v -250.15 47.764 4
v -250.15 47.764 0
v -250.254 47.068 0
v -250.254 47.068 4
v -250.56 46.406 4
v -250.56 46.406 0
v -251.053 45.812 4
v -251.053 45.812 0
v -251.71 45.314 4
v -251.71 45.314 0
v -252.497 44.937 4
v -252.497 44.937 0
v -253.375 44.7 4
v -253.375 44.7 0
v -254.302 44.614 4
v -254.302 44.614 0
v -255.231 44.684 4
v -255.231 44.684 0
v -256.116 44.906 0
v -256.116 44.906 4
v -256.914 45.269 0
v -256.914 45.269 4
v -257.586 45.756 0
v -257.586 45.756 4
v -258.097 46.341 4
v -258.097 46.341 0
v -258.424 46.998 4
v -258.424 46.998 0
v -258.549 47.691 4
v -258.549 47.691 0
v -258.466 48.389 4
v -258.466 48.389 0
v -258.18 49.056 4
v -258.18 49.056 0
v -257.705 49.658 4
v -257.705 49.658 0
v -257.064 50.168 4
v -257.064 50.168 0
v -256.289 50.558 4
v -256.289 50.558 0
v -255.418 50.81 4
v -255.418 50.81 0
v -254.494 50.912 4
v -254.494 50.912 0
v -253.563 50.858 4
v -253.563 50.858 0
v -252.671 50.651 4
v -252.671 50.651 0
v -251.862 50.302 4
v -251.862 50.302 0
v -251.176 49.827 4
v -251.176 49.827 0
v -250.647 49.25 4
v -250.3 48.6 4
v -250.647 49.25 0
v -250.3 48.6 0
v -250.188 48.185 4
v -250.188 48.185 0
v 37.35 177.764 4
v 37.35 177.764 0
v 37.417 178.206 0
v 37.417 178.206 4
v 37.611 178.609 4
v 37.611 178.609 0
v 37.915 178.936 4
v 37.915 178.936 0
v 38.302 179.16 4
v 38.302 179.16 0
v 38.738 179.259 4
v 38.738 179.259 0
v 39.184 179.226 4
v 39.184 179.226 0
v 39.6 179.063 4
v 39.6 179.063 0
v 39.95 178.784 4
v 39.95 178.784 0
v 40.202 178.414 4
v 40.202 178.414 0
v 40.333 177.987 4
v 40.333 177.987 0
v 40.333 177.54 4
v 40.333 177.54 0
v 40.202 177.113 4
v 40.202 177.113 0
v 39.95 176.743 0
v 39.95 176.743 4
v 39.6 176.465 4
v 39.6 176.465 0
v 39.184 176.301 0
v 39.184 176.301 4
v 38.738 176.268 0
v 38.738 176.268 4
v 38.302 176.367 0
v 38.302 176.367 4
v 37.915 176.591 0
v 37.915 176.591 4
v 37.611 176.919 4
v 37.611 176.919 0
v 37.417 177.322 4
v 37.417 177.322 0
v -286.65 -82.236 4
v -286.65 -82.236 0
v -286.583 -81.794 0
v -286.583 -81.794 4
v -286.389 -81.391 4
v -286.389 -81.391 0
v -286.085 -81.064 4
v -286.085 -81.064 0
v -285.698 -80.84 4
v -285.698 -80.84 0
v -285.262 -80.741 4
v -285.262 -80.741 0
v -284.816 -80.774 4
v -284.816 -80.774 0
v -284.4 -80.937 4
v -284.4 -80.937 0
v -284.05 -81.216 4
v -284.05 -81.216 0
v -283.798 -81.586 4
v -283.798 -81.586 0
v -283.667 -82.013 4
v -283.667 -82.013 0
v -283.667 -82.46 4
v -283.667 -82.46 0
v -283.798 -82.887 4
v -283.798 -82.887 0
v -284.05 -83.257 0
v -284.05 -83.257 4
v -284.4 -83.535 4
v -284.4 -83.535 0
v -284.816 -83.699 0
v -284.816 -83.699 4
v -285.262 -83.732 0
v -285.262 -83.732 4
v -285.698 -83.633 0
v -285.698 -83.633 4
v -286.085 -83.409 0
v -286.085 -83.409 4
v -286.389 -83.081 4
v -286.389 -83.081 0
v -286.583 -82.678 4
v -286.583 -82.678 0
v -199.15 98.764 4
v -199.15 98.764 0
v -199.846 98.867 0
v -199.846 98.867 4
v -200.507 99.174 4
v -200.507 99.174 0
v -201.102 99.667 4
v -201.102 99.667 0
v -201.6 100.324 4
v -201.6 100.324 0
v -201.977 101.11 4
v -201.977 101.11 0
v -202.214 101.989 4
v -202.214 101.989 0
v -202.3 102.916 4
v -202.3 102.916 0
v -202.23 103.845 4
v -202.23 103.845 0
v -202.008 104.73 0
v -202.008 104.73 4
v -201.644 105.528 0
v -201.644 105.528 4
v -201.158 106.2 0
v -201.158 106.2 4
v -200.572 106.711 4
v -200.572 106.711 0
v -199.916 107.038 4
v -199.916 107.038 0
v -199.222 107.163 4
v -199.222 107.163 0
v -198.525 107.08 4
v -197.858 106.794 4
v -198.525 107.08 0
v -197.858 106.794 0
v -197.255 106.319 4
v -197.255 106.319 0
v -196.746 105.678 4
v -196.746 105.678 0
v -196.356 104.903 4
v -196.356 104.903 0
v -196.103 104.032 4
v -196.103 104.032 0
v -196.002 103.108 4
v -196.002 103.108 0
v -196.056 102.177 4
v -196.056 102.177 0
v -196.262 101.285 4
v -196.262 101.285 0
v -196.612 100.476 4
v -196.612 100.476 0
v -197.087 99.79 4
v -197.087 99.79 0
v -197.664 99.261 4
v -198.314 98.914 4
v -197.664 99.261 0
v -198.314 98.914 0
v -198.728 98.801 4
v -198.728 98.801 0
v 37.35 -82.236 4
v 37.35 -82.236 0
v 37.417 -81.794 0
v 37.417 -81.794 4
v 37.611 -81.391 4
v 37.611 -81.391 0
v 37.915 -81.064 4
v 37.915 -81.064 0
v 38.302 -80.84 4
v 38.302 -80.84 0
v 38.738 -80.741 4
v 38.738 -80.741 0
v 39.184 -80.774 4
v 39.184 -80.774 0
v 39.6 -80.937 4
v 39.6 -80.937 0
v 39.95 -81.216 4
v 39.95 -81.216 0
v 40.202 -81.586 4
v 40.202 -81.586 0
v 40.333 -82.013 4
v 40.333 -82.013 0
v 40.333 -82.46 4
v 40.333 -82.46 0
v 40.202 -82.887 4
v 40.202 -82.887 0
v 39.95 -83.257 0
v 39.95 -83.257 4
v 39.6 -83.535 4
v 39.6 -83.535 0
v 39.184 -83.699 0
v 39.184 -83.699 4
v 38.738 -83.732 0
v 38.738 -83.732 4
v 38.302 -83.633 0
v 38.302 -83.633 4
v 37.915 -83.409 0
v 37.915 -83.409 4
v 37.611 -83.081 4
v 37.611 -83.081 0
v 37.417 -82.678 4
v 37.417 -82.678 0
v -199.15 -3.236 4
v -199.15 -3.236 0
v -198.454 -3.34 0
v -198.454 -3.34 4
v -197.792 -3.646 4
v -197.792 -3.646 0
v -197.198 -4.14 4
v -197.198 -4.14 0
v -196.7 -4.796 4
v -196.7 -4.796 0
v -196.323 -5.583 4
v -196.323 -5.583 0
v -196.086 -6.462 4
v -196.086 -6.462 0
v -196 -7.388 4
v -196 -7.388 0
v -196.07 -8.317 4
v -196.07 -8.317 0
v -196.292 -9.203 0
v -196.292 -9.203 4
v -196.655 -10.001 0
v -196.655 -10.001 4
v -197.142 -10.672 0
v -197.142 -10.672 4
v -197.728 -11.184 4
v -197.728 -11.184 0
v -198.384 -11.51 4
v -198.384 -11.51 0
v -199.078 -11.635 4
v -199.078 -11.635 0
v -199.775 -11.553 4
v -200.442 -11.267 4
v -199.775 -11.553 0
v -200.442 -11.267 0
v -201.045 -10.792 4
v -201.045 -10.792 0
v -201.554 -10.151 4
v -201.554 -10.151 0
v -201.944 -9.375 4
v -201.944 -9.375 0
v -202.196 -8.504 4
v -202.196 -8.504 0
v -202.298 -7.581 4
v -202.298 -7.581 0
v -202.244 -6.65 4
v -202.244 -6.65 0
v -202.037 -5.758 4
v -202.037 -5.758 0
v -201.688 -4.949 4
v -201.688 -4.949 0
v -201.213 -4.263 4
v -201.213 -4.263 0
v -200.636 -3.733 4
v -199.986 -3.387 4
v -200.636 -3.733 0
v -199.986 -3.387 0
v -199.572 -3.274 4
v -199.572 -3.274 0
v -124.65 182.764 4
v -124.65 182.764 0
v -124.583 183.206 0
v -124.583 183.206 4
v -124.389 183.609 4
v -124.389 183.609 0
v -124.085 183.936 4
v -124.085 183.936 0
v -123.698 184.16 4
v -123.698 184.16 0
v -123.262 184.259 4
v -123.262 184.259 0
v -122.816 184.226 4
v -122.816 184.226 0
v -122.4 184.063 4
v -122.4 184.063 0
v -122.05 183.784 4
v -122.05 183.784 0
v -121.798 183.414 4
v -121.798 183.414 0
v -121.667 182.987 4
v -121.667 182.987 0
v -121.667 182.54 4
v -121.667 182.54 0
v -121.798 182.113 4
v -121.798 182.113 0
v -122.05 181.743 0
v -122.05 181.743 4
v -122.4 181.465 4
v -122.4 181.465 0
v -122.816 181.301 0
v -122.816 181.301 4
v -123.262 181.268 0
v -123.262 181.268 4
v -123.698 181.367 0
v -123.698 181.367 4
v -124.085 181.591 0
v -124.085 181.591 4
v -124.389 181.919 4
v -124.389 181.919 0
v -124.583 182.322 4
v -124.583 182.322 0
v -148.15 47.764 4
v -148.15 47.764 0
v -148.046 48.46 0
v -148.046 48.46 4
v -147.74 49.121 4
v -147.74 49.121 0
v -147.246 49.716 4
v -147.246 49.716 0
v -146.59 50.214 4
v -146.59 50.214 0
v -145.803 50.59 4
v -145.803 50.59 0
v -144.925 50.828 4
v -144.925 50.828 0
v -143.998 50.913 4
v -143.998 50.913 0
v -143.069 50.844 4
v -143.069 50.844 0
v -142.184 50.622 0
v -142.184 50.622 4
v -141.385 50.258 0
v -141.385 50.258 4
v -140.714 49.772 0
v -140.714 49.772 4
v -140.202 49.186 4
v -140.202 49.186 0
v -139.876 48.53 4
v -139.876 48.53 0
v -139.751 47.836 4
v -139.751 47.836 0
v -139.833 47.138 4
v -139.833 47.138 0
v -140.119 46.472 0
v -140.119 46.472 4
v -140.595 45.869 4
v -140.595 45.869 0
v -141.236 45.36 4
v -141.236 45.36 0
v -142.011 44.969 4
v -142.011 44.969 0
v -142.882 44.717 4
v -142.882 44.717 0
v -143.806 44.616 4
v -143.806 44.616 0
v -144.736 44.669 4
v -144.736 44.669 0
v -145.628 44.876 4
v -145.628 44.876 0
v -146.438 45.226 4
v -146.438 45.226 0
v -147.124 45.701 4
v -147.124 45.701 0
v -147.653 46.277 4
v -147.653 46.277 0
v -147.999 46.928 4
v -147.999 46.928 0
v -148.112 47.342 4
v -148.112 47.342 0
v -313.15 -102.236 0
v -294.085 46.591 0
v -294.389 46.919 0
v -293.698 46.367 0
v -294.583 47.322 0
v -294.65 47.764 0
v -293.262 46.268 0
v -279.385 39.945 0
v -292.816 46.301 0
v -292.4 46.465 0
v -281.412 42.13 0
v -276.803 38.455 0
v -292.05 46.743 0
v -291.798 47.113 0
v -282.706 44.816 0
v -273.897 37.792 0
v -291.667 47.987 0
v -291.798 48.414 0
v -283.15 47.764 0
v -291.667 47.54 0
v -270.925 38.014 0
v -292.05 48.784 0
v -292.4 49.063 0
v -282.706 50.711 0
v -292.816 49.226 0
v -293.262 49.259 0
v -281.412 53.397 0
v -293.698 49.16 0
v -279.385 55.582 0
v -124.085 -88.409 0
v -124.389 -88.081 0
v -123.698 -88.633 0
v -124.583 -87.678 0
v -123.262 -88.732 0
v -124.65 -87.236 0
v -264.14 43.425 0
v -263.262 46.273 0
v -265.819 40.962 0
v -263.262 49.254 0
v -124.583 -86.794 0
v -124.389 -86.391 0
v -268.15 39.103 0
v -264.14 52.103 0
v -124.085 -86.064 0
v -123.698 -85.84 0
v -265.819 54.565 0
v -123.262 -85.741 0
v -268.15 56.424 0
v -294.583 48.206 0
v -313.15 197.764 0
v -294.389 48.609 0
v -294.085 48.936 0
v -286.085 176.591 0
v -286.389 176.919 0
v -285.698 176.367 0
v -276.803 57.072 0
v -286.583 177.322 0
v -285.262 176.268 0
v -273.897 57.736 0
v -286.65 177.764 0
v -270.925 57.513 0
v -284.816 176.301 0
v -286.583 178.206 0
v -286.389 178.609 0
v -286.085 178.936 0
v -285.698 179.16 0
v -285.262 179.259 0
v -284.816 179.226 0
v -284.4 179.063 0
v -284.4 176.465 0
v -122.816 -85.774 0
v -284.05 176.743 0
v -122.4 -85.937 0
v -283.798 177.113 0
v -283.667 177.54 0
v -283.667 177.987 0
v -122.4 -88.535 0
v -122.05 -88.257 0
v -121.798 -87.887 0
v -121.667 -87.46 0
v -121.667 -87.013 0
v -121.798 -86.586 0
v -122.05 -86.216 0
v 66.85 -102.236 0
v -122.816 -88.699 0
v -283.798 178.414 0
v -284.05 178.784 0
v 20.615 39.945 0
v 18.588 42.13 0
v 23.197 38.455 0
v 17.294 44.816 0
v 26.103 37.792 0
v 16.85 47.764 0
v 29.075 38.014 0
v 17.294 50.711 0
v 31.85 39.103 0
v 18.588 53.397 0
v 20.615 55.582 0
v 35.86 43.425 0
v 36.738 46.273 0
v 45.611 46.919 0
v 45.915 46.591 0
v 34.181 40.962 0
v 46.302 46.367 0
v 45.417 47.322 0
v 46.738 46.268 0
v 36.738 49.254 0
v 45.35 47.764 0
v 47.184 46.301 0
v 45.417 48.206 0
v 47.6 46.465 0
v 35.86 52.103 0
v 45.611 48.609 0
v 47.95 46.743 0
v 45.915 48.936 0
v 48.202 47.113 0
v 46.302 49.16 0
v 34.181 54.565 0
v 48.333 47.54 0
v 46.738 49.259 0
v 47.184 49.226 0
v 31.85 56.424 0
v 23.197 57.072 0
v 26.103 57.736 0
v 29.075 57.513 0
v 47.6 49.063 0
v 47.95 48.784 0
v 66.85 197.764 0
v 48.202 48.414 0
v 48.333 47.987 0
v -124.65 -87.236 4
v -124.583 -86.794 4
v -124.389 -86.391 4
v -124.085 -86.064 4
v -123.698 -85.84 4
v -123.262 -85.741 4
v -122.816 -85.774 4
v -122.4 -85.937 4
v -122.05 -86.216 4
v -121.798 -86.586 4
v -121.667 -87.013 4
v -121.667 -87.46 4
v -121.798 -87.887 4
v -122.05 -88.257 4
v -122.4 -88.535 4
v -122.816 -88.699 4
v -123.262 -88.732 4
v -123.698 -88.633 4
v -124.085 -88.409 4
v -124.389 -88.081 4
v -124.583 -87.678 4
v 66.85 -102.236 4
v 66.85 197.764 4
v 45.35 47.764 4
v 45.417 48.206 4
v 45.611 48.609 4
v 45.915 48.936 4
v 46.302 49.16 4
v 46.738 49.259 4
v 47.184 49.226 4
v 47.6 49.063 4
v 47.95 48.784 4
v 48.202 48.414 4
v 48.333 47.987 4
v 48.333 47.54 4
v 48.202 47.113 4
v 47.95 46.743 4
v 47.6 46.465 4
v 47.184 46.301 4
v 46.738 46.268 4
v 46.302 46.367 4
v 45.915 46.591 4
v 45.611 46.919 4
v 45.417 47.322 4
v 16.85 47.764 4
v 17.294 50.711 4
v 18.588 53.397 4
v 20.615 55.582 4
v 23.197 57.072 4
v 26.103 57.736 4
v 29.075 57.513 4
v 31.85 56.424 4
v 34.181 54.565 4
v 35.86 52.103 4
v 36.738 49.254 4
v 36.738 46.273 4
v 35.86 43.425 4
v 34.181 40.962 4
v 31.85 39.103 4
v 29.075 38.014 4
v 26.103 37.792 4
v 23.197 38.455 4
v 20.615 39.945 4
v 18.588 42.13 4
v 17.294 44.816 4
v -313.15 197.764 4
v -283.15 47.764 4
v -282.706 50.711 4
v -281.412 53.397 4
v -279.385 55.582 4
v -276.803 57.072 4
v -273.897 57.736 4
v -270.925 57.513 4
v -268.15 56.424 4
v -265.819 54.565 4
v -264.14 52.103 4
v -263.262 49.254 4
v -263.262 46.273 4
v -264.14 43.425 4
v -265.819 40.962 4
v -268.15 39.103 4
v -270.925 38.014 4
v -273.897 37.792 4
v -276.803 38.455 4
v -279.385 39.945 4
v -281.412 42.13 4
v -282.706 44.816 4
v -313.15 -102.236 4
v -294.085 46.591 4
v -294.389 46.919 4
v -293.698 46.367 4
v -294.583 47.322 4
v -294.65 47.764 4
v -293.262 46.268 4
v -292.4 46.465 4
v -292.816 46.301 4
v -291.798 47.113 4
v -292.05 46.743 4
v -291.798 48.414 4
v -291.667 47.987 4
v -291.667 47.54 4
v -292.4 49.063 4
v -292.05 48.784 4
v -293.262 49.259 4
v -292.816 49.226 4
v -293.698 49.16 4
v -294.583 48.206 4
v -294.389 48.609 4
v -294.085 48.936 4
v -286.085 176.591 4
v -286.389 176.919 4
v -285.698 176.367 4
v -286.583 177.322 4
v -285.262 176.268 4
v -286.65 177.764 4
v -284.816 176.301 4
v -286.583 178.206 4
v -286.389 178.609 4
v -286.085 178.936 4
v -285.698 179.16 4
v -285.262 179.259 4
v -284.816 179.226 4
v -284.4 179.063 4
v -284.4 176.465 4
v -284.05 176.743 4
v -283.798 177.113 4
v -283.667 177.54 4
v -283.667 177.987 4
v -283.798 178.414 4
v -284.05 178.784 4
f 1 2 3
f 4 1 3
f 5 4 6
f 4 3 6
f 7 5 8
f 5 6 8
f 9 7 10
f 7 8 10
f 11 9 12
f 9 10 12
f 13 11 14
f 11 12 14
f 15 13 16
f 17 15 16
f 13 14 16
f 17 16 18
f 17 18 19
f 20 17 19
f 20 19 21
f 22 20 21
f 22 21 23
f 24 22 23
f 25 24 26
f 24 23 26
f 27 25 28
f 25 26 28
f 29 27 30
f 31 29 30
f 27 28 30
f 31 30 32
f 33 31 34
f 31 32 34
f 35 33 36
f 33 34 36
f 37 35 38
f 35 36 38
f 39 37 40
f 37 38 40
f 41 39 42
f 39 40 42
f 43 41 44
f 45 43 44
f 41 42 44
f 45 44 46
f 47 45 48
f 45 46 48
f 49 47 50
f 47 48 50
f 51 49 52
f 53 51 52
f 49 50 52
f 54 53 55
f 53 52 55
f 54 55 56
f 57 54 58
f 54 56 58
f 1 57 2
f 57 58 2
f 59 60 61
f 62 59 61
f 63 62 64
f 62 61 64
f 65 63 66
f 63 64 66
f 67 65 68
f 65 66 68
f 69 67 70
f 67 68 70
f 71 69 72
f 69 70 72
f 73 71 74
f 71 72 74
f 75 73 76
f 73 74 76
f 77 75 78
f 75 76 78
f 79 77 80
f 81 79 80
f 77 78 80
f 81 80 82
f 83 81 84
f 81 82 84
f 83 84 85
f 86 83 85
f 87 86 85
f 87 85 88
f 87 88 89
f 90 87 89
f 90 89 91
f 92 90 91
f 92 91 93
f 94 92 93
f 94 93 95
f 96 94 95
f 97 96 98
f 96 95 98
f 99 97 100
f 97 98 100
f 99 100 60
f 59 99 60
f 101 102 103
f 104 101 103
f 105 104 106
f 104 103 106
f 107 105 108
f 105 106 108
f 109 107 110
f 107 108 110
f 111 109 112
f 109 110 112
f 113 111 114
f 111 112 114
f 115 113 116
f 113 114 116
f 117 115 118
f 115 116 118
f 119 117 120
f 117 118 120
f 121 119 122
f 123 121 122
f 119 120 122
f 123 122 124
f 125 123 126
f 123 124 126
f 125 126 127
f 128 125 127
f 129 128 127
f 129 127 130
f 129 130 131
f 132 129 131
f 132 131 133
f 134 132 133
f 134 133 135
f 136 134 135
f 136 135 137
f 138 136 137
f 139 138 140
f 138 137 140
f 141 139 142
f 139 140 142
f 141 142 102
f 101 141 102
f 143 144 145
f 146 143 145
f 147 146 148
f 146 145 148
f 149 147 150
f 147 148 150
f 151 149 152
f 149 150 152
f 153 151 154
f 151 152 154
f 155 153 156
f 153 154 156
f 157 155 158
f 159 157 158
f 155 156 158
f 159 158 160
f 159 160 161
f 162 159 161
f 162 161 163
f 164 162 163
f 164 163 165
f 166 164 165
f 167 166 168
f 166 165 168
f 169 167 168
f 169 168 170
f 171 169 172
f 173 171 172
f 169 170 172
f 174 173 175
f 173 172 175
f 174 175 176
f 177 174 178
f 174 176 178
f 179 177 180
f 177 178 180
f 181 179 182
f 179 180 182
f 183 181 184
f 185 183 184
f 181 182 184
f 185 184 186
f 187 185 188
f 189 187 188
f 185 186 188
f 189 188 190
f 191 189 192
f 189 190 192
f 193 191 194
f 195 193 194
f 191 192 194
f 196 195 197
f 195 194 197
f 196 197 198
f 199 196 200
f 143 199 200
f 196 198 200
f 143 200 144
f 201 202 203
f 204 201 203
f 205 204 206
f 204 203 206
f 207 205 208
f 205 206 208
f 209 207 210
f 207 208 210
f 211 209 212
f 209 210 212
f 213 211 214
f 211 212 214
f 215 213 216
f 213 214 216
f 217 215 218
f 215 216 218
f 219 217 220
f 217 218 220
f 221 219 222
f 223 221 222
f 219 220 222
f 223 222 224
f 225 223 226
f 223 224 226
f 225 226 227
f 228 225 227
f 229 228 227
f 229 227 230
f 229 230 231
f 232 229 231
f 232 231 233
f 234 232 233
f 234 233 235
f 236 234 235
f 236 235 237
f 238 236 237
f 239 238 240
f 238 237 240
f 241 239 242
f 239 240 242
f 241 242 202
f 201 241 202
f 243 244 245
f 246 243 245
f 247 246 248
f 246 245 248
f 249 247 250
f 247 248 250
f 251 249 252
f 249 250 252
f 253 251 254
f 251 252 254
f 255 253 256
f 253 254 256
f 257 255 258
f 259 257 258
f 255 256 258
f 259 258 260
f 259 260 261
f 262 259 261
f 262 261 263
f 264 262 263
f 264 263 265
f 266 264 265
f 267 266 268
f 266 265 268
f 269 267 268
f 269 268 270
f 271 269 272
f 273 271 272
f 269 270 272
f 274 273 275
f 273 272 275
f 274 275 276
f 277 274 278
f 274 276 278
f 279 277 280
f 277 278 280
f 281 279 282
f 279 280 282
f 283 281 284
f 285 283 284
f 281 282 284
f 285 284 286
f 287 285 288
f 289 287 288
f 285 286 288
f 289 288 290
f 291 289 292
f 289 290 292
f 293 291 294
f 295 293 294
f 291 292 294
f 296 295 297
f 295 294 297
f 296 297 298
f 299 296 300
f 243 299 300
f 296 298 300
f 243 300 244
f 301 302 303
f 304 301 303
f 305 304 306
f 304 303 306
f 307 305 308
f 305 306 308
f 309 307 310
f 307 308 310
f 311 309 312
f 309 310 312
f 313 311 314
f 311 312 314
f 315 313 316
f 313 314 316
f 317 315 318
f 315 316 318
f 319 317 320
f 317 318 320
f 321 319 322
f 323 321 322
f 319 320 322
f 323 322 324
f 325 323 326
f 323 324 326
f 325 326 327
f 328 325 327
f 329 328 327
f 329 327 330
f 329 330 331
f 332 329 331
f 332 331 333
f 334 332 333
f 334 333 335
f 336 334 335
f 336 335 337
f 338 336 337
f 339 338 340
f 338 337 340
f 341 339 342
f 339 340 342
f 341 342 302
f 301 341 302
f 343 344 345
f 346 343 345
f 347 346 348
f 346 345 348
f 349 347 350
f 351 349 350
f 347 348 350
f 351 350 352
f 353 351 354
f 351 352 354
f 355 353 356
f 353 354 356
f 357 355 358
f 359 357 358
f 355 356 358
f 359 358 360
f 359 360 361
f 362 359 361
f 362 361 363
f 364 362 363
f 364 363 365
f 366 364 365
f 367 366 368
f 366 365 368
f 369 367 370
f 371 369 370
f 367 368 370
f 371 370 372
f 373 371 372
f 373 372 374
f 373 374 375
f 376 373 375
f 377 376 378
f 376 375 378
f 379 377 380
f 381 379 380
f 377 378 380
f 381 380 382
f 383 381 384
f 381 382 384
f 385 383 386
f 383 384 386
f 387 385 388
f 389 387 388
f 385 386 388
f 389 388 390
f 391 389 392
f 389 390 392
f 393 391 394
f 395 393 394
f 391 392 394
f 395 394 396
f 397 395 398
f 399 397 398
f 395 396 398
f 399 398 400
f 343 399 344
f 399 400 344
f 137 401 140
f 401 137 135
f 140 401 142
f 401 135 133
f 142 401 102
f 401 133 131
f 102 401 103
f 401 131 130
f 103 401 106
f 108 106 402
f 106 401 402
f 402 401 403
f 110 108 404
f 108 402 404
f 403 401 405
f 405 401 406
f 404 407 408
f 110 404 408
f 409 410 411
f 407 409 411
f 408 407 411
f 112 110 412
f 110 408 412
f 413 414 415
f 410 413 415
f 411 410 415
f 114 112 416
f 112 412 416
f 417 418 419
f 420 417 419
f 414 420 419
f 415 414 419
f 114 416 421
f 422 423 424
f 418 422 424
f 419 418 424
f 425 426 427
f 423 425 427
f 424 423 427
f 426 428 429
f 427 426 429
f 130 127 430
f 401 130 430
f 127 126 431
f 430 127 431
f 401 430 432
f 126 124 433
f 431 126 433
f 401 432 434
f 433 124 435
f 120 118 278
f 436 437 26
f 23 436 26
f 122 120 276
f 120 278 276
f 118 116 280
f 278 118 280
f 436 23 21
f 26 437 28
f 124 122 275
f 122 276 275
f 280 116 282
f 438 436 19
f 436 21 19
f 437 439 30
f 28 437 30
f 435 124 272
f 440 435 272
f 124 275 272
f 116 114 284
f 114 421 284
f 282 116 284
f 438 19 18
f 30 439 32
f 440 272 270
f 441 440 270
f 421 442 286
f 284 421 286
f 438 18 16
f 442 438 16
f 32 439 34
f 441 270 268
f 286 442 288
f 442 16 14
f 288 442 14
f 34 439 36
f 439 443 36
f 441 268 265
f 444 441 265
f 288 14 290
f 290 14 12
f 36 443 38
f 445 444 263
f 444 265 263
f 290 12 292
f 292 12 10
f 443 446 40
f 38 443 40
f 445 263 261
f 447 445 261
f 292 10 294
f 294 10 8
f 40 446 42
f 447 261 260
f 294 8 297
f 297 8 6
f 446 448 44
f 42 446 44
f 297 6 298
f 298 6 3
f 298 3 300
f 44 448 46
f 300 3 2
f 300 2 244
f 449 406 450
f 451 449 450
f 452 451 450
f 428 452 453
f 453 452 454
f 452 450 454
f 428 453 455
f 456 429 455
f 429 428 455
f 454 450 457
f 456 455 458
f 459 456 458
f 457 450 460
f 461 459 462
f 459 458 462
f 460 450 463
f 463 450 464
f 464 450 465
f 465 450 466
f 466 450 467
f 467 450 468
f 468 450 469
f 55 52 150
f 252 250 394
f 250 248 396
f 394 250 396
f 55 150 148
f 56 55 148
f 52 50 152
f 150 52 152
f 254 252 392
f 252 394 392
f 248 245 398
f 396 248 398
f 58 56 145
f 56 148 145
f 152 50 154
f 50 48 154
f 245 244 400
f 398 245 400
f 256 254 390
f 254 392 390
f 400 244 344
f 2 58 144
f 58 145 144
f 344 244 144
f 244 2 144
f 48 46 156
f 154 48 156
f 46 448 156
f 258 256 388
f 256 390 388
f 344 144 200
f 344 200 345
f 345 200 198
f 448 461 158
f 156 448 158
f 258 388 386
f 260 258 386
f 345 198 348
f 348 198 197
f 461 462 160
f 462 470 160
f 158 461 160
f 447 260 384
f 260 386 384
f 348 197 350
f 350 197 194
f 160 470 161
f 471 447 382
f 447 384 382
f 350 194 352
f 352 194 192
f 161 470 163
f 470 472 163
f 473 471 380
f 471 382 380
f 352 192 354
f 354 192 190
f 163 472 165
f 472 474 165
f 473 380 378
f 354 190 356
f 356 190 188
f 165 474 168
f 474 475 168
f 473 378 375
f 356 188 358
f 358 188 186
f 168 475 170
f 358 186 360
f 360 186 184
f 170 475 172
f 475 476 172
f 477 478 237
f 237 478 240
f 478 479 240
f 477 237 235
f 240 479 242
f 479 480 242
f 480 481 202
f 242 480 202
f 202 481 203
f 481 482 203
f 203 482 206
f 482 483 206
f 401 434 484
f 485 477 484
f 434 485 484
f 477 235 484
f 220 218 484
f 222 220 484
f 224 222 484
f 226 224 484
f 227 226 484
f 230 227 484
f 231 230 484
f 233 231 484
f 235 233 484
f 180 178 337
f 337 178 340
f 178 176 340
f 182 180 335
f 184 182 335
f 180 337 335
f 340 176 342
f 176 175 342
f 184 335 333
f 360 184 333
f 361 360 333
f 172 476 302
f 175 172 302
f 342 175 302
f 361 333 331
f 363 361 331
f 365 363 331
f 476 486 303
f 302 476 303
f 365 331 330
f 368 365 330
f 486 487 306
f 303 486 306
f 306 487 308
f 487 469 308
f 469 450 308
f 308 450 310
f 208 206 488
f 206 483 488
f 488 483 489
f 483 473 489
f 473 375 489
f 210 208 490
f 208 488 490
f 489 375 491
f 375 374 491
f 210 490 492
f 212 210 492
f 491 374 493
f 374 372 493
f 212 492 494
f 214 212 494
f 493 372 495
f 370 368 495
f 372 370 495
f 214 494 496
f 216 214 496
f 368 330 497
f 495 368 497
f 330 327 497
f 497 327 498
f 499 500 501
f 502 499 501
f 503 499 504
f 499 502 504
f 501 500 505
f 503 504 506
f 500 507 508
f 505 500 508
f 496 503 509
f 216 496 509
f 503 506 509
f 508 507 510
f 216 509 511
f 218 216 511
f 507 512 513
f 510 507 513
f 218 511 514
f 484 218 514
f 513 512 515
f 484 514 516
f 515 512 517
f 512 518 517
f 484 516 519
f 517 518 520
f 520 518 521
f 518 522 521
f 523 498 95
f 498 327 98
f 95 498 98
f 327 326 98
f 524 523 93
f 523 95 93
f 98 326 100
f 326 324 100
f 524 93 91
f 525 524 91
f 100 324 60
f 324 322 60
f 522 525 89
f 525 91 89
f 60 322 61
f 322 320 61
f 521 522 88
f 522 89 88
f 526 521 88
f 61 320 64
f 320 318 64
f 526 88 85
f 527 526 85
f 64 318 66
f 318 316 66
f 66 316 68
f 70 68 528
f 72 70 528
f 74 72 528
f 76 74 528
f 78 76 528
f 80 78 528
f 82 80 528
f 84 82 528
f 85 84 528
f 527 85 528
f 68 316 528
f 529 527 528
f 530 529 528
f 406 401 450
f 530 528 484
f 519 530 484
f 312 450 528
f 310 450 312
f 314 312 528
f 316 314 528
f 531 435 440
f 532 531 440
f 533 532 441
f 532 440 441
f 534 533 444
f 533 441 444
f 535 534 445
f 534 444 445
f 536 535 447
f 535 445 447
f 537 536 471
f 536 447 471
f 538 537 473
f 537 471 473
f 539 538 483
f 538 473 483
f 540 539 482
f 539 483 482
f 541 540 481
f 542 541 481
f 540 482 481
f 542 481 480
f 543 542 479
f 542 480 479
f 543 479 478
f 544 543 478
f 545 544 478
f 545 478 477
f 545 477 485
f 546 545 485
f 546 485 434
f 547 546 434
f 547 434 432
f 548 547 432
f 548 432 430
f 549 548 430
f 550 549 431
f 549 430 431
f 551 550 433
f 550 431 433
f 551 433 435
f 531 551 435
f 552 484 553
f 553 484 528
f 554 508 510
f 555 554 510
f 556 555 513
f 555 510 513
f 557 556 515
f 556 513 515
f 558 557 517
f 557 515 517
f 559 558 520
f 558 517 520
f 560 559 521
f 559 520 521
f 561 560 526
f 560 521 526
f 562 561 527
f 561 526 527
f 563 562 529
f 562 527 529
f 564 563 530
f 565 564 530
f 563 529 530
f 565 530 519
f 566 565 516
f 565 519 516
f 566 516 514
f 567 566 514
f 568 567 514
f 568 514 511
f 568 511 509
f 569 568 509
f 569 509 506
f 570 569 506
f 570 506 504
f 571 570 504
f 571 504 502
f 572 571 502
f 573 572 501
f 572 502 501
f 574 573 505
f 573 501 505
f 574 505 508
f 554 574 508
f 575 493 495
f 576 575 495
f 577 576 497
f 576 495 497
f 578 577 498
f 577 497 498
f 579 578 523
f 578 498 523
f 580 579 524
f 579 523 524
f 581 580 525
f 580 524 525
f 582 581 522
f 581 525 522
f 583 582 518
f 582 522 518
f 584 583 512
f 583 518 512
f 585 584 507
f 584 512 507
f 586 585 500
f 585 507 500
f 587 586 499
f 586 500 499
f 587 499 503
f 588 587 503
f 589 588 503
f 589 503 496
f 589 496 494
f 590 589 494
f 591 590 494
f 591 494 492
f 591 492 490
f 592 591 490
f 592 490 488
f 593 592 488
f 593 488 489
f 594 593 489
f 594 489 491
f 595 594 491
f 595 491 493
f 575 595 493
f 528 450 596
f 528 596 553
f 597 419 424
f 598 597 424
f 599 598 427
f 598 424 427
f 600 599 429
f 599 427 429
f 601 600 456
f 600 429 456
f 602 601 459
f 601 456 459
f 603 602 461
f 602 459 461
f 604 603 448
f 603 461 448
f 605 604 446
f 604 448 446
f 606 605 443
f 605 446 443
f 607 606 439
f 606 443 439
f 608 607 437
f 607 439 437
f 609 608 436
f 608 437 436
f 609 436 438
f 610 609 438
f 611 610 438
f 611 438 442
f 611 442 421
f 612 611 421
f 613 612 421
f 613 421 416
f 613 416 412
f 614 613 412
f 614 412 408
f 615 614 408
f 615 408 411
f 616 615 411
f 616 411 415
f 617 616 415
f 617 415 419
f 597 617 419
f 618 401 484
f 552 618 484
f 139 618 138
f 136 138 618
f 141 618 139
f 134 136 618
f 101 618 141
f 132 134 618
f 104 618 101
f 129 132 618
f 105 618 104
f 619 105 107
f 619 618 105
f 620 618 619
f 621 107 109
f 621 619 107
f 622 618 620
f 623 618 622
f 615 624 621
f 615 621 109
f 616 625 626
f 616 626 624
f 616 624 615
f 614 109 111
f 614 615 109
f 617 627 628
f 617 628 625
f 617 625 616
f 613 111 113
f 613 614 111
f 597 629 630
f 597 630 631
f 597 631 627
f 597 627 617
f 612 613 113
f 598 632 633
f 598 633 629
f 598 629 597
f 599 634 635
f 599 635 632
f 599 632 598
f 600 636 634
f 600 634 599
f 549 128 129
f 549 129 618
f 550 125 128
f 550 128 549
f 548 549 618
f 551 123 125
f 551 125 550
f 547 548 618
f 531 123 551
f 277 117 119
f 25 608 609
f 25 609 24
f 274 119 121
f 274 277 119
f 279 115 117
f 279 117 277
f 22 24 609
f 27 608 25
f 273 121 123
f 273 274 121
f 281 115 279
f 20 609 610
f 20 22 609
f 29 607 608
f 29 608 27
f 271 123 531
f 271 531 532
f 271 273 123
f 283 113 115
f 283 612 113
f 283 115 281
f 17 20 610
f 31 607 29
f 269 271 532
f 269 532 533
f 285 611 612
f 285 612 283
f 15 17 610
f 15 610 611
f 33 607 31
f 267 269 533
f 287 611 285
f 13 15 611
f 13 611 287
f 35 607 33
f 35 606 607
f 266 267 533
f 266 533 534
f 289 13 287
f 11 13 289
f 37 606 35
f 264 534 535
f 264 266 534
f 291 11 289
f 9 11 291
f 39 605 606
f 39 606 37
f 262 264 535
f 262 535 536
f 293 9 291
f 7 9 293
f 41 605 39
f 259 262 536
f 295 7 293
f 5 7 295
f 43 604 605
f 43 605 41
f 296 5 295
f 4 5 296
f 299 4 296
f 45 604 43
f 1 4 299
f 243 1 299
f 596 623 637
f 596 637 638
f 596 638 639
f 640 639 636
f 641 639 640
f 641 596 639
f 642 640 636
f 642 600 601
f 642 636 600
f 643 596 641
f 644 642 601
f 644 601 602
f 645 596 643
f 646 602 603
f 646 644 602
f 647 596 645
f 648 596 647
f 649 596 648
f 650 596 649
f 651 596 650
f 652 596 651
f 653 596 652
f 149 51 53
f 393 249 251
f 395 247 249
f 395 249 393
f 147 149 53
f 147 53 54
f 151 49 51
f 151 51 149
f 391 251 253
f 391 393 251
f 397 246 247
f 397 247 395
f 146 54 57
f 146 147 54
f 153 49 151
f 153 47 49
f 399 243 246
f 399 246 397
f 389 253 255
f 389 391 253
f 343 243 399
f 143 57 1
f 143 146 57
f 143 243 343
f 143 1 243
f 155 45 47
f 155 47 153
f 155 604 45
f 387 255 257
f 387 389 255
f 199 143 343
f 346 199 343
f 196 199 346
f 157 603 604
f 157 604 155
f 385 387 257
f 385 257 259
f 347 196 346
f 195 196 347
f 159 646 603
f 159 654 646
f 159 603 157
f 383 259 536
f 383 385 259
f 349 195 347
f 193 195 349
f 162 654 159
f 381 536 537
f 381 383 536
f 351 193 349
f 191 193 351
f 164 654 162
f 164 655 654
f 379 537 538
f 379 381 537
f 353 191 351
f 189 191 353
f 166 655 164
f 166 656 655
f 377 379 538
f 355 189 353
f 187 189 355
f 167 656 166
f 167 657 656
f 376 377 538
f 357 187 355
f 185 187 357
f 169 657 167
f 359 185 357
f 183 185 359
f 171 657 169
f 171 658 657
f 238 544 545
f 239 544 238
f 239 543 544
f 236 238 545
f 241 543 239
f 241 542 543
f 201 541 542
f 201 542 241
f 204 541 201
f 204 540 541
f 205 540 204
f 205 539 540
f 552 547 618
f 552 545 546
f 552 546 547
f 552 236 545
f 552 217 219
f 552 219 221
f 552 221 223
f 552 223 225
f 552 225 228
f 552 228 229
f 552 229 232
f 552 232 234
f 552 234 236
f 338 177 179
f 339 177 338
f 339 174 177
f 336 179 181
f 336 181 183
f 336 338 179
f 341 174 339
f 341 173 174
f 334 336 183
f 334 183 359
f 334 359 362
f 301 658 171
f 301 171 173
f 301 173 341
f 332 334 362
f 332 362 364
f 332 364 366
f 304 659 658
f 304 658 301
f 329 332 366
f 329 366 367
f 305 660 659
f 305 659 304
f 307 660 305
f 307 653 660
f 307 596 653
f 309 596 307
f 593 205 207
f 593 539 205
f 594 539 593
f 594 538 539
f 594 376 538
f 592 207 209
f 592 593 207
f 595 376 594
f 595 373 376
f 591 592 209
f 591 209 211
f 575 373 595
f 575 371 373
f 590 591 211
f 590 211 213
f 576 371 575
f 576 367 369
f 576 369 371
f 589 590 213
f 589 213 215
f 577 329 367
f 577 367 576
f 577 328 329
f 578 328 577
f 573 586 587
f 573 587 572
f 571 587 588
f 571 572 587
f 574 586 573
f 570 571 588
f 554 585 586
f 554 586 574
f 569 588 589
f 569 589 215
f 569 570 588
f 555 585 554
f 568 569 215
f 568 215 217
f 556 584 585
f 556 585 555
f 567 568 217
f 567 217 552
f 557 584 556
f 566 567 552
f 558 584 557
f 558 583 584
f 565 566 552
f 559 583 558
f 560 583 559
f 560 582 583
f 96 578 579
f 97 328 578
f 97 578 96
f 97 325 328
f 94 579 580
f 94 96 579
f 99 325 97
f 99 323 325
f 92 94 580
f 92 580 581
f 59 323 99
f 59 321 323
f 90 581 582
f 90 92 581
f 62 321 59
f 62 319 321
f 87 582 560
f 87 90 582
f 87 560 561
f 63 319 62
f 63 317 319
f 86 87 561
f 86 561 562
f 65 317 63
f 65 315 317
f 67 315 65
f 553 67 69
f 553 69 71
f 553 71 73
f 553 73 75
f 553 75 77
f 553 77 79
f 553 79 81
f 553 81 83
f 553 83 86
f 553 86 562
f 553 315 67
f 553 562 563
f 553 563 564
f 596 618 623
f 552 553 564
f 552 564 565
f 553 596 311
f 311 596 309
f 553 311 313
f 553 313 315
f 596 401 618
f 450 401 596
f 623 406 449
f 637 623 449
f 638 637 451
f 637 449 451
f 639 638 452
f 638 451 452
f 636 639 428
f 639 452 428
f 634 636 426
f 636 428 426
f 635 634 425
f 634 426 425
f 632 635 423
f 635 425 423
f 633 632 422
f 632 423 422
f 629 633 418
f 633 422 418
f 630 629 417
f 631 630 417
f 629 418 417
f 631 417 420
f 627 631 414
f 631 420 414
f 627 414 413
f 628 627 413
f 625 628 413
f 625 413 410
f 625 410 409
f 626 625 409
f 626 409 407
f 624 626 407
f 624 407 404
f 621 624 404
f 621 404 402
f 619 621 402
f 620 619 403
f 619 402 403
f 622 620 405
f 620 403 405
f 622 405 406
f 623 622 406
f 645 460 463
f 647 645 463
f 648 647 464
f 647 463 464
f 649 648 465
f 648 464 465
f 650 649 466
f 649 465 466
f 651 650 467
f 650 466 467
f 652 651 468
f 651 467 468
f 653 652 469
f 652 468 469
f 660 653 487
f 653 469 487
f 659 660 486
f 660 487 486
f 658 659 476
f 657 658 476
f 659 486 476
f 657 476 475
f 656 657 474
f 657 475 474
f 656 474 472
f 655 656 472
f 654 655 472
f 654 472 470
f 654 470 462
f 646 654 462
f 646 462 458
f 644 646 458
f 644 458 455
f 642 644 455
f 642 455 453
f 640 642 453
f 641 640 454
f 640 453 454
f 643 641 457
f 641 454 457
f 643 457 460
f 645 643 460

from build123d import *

# Parameters (mm, degrees)
SKETCH3_W           = 380
SKETCH3_H           = 300
BOSS_EXTRUDE1_DEPTH = 4
HOLE2_D             = 20
HOLE2_DEPTH         = 100
SKETCH10_R          = 1.5
CUT_EXTRUDE1_DEPTH  = 4
SKETCH11_R          = 1.5
CUT_EXTRUDE2_DEPTH  = 4
SKETCH12_RX         = 4.2
SKETCH12_RY         = 3.15
CUT_EXTRUDE9_DEPTH  = 4


with BuildPart() as part:
    # Sketch3 → Boss-Extrude1 (new body)
    with BuildSketch(Plane.XY):
        with Locations((-123.149881766, 47.763665148)):
            Rectangle(SKETCH3_W, SKETCH3_H)
    extrude(amount=BOSS_EXTRUDE1_DEPTH)

    # Hole2
    with Locations(Plane(origin=(-273.149881766, 47.763665148, 4), x_dir=(1, 0, 0), z_dir=(0, 0, 1))):
        with Locations((0, 0), (300, 0)):
            Hole(HOLE2_D / 2, depth=HOLE2_DEPTH)

    # Sketch10 → Cut-Extrude1 (cut)
    with BuildSketch(Plane(origin=(0, 0, 0), x_dir=(-1, 0, 0), z_dir=(0, 0, -1))):
        with Locations((285.149881766, 177.763665148)):
            Circle(SKETCH10_R)
        with Locations((-38.850118234, 177.763665148)):
            Circle(SKETCH10_R)
        with Locations((-38.850118234, -82.236334852)):
            Circle(SKETCH10_R)
        with Locations((285.149881766, -82.236334852)):
            Circle(SKETCH10_R)
    extrude(amount=-CUT_EXTRUDE1_DEPTH, mode=Mode.SUBTRACT)

    # Sketch11 → Cut-Extrude2 (cut)
    with BuildSketch(Plane(origin=(0, 0, 0), x_dir=(-1, 0, 0), z_dir=(0, 0, -1))):
        with Locations((293.149881766, 47.763665148)):
            Circle(SKETCH11_R)
        with Locations((123.149881766, 182.763665148)):
            Circle(SKETCH11_R)
        with Locations((-46.850118234, 47.763665148)):
            Circle(SKETCH11_R)
        with Locations((123.149881766, -87.236334852)):
            Circle(SKETCH11_R)
    extrude(amount=-CUT_EXTRUDE2_DEPTH, mode=Mode.SUBTRACT)

    # Sketch12 → Cut-Extrude9 (cut)
    with BuildSketch(Plane(origin=(0, 0, 0), x_dir=(-1, 0, 0), z_dir=(0, 0, -1))):
        with Locations(Location((199.149881766, -7.436334852), (0, 0, 90))):
            Ellipse(SKETCH12_RX, SKETCH12_RY)
        with Locations(Location((143.949881766, 47.763665148), (0, 0, 0))):
            Ellipse(SKETCH12_RX, SKETCH12_RY)
        with Locations(Location((199.149881766, 102.963665148), (0, 0, -90))):
            Ellipse(SKETCH12_RX, SKETCH12_RY)
        with Locations(Location((254.349881766, 47.763665148), (0, 0, 180))):
            Ellipse(SKETCH12_RX, SKETCH12_RY)
    extrude(amount=-CUT_EXTRUDE9_DEPTH, mode=Mode.SUBTRACT)


solid = part.part
